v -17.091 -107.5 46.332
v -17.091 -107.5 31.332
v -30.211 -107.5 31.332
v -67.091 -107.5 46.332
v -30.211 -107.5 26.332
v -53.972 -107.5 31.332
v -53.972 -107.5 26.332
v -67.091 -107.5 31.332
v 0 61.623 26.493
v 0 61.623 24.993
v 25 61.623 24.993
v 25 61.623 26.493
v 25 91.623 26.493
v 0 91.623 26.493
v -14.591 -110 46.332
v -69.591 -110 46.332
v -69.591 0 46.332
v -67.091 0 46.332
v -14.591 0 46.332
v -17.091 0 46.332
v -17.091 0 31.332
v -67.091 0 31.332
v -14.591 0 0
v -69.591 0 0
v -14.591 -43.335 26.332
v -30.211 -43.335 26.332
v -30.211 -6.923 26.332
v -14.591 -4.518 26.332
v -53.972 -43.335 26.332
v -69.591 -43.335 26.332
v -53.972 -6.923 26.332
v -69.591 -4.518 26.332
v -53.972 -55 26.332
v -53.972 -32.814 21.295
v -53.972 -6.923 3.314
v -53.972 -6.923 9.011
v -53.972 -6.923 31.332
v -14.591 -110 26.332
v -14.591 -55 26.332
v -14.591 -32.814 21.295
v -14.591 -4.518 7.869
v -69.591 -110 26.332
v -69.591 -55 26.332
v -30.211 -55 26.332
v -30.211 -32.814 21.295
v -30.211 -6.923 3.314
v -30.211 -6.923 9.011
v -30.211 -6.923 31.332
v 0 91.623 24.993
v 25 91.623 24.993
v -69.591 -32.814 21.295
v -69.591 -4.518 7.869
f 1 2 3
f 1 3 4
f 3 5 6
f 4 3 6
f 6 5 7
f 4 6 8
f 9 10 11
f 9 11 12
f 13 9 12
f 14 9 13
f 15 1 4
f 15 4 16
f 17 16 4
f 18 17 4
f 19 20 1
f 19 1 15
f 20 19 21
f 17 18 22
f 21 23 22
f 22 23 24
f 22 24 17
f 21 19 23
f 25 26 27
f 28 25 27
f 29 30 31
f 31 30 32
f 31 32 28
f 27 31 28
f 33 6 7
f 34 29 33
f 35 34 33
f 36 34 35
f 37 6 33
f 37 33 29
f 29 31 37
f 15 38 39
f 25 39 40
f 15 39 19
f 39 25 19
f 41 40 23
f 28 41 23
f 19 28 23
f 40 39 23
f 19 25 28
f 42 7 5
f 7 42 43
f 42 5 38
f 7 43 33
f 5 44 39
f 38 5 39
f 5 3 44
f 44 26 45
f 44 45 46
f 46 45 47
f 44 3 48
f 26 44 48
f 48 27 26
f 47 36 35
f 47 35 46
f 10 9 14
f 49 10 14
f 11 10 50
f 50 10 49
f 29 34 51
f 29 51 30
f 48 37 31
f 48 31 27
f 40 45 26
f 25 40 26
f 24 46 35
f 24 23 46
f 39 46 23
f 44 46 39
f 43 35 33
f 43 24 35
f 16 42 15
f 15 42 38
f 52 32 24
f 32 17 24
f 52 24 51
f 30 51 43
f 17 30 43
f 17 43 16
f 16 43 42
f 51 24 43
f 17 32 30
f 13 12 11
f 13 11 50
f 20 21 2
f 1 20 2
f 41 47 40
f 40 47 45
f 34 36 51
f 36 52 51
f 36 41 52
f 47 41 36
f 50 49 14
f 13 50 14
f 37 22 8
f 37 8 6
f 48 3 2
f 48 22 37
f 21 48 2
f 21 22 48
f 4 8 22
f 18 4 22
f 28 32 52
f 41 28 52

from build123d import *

# Parameters (mm, degrees)
F0_W      = 55
F0_H      = 5
F1_DEPTH  = 110
F3_DEPTH  = 55
F5_DEPTH  = 15
F4_W      = 23.761057
F4_H      = 100.577244
F6_DEPTH  = 31.332726
F8_DEPTH  = 55.001
F9_W      = 30
F9_H      = 1.5
F10_DEPTH = 25


with BuildPart() as f1:
    # F0 (on Front) → F1 (new body)
    with BuildSketch(Plane.XZ):
        with Locations((-42.091317, 28.831726)):
            Rectangle(F0_W, F0_H)
    extrude(amount=F1_DEPTH)

    # F2 (on face) → F3 (join, through all)
    with BuildSketch(Plane(origin=(-69.591317, 0, 0), x_dir=(0, -1, 0), z_dir=(-1, 0, 0))):
        Polygon((55, 26.331726), (0, 26.331726), (0, 0), align=None)
    extrude(amount=-F3_DEPTH)

    # F4 (on face) → F5 (join)
    with BuildSketch(Plane.XY.offset(31.331726)):
        Polygon((-67.091317, -107.5), (-67.091317, 0), (-69.591317, 0), (-69.591317, -110), (-14.591317, -110), (-14.591317, 0), (-17.091317, 0), (-17.091317, -107.5), (-30.210789, -107.5), (-53.971846, -107.5), align=None)
    extrude(amount=F5_DEPTH)

    # F4 (on face) → F6 (cut, through all)
    with BuildSketch(Plane.XY.offset(31.331726)):
        with Locations((-42.091318, -57.211378)):
            Rectangle(F4_W, F4_H)
    extrude(amount=-F6_DEPTH, mode=Mode.SUBTRACT)

    # F7 (on face) → F8 (cut, through all)
    with BuildSketch(Plane(origin=(-69.591317, 0, 0), x_dir=(0, -1, 0), z_dir=(-1, 0, 0))):
        Polygon((32.814439, 21.294716), (43.335418, 26.331726), (4.517639, 26.331726), (4.517639, 21.294716), (4.517639, 7.869426), align=None)
    extrude(amount=-F8_DEPTH, mode=Mode.SUBTRACT)


with BuildPart() as f10:
    # F9 (on Right) → F10 (new body)
    with BuildSketch(Plane.YZ):
        with Locations((76.623397, 25.743366)):
            Rectangle(F9_W, F9_H)
    extrude(amount=F10_DEPTH)


solid = Compound([f1.part, f10.part])
